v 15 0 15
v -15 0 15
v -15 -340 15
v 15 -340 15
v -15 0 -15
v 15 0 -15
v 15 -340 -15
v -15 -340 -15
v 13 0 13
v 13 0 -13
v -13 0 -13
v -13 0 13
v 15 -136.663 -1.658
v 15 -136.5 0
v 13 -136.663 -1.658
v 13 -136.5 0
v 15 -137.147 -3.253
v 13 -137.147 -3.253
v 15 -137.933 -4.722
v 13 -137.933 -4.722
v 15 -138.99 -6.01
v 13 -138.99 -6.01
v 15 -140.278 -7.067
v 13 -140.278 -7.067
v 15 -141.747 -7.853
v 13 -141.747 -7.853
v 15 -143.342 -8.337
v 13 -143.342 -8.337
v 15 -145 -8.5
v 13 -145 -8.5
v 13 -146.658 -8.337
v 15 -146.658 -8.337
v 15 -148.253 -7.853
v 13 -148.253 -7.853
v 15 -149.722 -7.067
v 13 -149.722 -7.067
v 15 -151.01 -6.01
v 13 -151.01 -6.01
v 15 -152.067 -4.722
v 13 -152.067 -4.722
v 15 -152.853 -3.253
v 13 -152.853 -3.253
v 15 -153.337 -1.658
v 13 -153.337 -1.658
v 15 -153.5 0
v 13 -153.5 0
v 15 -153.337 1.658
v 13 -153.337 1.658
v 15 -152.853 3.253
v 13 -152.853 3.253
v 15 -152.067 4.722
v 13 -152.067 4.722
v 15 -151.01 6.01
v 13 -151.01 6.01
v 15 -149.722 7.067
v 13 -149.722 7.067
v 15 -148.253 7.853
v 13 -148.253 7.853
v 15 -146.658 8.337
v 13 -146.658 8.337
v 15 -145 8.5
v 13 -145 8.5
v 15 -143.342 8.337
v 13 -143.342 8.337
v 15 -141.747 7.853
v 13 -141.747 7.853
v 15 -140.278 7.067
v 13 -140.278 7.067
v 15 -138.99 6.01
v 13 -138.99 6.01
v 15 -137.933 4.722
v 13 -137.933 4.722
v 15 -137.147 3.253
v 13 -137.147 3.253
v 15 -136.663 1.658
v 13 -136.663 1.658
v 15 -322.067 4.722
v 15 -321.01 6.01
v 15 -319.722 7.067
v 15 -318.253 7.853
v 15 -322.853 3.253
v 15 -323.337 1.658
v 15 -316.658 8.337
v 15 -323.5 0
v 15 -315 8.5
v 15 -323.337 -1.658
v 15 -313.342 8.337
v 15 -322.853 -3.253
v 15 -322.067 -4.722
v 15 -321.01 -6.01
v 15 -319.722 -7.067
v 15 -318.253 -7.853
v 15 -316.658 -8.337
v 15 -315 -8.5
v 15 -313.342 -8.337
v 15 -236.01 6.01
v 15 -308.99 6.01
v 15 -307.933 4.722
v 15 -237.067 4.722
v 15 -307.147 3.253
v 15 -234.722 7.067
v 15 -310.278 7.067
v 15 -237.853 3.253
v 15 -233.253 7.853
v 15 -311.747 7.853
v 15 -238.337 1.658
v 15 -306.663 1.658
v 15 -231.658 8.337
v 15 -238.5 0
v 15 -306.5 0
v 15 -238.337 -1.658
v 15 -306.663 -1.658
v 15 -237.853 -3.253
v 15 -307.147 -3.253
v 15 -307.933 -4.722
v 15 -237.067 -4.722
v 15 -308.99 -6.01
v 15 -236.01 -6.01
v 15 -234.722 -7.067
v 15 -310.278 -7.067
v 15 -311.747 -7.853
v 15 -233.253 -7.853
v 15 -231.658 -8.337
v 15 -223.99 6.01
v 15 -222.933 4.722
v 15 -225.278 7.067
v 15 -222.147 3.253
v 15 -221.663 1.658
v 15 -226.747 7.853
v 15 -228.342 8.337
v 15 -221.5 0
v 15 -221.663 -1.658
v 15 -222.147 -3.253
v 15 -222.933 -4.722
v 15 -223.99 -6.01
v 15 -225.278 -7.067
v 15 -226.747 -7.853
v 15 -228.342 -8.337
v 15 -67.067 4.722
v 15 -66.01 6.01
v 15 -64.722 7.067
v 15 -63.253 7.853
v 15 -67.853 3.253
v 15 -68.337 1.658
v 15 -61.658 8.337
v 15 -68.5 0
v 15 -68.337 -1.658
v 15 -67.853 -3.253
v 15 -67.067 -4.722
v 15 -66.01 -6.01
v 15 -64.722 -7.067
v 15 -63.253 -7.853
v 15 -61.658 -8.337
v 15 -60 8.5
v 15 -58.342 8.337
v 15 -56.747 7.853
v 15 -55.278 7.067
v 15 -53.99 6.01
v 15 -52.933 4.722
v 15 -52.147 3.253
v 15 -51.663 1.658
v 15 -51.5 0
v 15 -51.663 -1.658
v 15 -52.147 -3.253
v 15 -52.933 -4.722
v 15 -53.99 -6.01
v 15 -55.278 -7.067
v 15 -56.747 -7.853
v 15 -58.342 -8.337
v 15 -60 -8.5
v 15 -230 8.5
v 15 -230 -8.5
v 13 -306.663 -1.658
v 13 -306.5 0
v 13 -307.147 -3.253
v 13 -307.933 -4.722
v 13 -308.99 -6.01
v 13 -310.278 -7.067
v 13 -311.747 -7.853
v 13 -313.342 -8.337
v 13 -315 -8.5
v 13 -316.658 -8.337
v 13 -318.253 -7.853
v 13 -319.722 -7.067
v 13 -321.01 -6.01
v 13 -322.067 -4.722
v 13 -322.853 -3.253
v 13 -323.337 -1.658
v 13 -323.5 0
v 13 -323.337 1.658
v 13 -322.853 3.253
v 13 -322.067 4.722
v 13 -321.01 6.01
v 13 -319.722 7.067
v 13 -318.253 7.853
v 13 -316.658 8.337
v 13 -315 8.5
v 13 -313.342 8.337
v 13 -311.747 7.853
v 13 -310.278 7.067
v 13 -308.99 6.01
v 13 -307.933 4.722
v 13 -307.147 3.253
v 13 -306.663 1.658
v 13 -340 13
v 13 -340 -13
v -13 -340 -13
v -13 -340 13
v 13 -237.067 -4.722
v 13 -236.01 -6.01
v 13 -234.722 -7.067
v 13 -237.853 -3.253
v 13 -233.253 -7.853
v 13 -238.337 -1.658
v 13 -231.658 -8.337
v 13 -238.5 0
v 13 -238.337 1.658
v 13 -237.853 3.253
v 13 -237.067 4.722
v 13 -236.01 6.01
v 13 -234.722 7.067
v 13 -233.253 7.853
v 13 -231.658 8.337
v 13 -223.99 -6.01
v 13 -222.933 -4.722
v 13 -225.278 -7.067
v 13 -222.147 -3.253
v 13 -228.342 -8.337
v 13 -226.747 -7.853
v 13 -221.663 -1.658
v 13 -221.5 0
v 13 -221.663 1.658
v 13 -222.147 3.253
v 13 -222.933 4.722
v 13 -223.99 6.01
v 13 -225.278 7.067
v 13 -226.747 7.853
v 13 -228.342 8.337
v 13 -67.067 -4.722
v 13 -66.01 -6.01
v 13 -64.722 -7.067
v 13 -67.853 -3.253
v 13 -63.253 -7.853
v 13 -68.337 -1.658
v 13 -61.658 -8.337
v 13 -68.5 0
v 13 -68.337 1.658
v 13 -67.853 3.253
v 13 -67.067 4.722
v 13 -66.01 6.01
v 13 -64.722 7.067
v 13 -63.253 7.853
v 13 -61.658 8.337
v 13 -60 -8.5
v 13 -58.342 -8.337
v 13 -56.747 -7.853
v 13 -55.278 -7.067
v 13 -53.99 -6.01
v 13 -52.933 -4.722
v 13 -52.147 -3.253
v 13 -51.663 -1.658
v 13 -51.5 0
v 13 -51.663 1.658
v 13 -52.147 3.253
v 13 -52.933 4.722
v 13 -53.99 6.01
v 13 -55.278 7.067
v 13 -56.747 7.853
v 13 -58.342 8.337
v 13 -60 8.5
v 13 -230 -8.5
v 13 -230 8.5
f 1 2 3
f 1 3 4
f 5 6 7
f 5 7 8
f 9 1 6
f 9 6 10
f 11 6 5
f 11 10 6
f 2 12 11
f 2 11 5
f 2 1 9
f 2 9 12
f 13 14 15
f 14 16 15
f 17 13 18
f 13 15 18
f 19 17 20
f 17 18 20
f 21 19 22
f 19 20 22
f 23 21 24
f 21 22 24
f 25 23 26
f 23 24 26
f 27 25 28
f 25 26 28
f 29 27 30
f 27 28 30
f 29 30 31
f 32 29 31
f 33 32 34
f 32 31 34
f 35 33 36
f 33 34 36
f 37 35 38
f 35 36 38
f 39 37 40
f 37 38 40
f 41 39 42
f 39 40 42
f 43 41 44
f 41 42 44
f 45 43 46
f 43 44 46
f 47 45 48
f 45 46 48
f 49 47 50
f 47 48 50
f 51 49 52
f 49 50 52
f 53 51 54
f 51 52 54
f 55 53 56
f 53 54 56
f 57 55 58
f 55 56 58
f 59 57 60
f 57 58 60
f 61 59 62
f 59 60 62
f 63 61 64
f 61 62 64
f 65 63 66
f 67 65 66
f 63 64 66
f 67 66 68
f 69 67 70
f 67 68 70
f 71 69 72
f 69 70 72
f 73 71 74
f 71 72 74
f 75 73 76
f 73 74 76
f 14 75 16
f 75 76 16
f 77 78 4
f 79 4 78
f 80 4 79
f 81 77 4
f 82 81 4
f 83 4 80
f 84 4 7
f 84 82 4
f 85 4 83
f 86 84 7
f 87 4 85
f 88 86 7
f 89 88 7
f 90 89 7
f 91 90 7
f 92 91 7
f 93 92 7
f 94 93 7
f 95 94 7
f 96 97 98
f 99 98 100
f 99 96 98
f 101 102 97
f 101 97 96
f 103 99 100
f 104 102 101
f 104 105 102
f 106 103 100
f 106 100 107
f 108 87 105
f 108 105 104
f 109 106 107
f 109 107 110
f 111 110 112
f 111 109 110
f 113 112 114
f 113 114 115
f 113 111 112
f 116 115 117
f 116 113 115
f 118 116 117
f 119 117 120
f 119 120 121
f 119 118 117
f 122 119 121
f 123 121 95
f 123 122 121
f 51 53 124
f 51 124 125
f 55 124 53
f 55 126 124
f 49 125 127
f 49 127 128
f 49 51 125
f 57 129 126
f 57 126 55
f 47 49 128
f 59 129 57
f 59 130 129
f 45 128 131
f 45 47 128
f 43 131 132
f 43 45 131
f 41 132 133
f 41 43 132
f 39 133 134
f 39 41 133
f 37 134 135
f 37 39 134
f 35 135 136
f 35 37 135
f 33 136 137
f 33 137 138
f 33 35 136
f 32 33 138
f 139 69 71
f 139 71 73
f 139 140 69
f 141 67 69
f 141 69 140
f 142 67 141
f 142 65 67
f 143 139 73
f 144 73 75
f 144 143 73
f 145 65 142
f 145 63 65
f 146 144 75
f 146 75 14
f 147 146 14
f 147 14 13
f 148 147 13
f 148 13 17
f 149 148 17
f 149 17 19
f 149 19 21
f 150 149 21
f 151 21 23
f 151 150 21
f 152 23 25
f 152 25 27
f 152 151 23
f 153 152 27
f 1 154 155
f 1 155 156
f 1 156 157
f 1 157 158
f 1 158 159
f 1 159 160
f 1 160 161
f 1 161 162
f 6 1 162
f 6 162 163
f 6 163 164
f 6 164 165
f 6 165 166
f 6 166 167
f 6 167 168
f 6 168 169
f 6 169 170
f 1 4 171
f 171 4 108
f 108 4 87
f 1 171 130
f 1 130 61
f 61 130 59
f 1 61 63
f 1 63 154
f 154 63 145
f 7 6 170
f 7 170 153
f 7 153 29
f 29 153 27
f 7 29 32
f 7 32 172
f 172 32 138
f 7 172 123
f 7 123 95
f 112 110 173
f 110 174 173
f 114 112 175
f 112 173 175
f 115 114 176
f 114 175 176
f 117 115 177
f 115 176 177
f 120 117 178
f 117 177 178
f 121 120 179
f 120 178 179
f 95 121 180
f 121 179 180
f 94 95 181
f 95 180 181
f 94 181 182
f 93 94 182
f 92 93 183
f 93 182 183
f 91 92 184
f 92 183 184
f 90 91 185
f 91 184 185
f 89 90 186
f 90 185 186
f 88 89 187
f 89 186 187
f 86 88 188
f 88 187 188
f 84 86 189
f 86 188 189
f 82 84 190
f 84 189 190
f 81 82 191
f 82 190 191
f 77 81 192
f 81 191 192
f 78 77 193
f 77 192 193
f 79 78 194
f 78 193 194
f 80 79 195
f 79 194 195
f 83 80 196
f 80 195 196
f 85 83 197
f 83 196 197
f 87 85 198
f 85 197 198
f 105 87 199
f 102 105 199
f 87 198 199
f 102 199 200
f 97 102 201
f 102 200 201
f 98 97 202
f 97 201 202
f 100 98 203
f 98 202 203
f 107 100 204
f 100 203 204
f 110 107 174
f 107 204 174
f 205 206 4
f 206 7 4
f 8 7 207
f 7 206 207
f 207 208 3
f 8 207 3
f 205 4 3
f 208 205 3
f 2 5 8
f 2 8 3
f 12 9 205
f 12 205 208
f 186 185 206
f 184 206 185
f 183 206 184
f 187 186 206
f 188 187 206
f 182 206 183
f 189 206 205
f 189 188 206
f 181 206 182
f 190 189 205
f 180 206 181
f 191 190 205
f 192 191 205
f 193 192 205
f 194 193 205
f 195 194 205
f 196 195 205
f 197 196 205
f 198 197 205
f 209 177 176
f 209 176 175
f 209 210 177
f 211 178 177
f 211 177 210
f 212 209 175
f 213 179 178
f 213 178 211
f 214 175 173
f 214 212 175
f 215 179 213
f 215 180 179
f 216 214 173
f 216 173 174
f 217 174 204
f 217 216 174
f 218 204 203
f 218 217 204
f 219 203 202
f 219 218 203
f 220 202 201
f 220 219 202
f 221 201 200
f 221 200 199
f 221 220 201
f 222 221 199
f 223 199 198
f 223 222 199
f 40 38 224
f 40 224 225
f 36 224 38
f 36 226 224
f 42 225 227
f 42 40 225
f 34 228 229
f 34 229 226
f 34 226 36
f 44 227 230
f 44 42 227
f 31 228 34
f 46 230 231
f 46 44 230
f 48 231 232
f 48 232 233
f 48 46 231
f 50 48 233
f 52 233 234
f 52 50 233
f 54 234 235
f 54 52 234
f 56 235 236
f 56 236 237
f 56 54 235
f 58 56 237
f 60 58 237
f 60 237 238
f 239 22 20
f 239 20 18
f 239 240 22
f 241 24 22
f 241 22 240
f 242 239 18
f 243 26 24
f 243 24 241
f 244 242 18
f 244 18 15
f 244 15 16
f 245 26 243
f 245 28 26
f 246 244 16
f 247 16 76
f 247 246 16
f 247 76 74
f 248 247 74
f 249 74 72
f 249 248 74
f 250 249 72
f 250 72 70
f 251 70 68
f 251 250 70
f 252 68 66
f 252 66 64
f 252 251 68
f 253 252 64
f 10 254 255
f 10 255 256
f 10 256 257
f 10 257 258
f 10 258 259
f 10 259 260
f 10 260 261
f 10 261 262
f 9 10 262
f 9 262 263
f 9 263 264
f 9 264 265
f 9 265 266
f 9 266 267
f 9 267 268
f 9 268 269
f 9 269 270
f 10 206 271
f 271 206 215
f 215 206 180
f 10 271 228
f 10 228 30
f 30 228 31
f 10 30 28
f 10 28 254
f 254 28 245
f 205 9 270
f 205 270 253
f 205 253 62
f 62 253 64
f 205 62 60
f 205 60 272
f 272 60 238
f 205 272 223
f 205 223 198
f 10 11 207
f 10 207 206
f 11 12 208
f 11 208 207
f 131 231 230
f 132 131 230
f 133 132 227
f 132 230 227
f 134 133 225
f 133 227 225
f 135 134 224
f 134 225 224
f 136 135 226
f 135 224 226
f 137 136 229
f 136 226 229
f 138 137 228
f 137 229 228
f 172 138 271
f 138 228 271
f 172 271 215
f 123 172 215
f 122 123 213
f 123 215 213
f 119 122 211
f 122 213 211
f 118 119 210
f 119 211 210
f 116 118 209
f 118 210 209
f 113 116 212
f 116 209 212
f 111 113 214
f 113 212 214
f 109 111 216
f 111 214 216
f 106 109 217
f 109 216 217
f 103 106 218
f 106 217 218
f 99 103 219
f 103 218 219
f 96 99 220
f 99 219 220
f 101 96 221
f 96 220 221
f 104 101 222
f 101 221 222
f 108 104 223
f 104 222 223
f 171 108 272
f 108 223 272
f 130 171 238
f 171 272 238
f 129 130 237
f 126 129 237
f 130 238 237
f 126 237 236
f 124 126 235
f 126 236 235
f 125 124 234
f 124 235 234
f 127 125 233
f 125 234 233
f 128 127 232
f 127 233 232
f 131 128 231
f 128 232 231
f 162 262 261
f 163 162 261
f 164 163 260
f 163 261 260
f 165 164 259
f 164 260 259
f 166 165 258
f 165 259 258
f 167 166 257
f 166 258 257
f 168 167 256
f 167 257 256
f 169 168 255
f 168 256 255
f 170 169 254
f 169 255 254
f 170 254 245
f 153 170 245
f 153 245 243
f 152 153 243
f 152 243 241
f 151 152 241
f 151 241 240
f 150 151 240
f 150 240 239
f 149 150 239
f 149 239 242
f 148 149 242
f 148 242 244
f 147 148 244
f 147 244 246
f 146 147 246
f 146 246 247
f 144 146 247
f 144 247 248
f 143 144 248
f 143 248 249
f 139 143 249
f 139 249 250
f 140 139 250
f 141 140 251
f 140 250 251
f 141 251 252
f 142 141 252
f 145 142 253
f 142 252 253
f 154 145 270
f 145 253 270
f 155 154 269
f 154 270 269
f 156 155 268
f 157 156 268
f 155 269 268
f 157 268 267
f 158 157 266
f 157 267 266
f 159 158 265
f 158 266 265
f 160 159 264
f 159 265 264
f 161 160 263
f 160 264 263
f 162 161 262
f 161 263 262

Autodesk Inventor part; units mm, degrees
ref_plane "YZ Plane" through (0, 0, 0) normal (1, 0, 0) x (0, 1, 0)
ref_plane "XZ Plane" through (0, 0, 0) normal (0, 1, 0) x (-1, 0, 0)
ref_plane "XY Plane" through (0, 0, 0) normal (0, 0, 1) x (1, 0, 0)
sketch "Sketch9" plane through (0, 0, 0) normal (0, 1, 0) x (-1, 0, 0)
  line L0 (15, 15) -> (-15, 15)
  line L1 (-15, 15) -> (-15, -15)
  line L2 (-15, -15) -> (15, -15)
  line L3 (15, -15) -> (15, 15)
  line L4 (15, 15) -> (-15, -15) construction
  line L5 (-15, 15) -> (15, -15) construction
  line L6 (-13, 13) -> (13, 13)
  line L7 (13, 13) -> (13, -13)
  line L8 (13, -13) -> (-13, -13)
  line L9 (-13, -13) -> (-13, 13)
  point P0 (0, 0)
  dimension "d172" = 30
  dimension "d173" = 30
  dimension "d174" = 2
extrude "Extrusion3" add sketch "Sketch9" against normal blind 340
sketch "Sketch10" plane through (0, 0, 0) normal (1, 0, 0) x (0, 1, 0)
  line L0 (0, 15) -> (0, -15) construction
  line L1 (0, 15) -> (-340, 15) construction
  line L2 (-340, -15) -> (-340, 15) construction
  line L3 (0, -15) -> (-340, -15) construction
  line L4 (-68.5, 8.5) -> (-51.5, 8.5)
  line L5 (-51.5, 8.5) -> (-51.5, -8.5)
  line L6 (-51.5, -8.5) -> (-68.5, -8.5)
  line L7 (-68.5, -8.5) -> (-68.5, 8.5)
  line L8 (-68.5, 8.5) -> (-51.5, -8.5) construction
  line L9 (-51.5, 8.5) -> (-68.5, -8.5) construction
  line L10 (0, 0) -> (30, 0)
  circle A0 centre (-60, 0) radius 8.5
  dimension "d177" = 17
  dimension "d178" = 17
  dimension "d181" = 30
  dimension "d182" = 90
extrude "Extrusion4" cut sketch "Sketch10" along normal through all contours A0
pattern_linear "Rectangular Pattern4" count 4 spacing 85 along (0, -1, 0) of "Extrusion4"
properties part number "SLM 1661 FDS 1000 way tube 1" material "Stainless Steel"
